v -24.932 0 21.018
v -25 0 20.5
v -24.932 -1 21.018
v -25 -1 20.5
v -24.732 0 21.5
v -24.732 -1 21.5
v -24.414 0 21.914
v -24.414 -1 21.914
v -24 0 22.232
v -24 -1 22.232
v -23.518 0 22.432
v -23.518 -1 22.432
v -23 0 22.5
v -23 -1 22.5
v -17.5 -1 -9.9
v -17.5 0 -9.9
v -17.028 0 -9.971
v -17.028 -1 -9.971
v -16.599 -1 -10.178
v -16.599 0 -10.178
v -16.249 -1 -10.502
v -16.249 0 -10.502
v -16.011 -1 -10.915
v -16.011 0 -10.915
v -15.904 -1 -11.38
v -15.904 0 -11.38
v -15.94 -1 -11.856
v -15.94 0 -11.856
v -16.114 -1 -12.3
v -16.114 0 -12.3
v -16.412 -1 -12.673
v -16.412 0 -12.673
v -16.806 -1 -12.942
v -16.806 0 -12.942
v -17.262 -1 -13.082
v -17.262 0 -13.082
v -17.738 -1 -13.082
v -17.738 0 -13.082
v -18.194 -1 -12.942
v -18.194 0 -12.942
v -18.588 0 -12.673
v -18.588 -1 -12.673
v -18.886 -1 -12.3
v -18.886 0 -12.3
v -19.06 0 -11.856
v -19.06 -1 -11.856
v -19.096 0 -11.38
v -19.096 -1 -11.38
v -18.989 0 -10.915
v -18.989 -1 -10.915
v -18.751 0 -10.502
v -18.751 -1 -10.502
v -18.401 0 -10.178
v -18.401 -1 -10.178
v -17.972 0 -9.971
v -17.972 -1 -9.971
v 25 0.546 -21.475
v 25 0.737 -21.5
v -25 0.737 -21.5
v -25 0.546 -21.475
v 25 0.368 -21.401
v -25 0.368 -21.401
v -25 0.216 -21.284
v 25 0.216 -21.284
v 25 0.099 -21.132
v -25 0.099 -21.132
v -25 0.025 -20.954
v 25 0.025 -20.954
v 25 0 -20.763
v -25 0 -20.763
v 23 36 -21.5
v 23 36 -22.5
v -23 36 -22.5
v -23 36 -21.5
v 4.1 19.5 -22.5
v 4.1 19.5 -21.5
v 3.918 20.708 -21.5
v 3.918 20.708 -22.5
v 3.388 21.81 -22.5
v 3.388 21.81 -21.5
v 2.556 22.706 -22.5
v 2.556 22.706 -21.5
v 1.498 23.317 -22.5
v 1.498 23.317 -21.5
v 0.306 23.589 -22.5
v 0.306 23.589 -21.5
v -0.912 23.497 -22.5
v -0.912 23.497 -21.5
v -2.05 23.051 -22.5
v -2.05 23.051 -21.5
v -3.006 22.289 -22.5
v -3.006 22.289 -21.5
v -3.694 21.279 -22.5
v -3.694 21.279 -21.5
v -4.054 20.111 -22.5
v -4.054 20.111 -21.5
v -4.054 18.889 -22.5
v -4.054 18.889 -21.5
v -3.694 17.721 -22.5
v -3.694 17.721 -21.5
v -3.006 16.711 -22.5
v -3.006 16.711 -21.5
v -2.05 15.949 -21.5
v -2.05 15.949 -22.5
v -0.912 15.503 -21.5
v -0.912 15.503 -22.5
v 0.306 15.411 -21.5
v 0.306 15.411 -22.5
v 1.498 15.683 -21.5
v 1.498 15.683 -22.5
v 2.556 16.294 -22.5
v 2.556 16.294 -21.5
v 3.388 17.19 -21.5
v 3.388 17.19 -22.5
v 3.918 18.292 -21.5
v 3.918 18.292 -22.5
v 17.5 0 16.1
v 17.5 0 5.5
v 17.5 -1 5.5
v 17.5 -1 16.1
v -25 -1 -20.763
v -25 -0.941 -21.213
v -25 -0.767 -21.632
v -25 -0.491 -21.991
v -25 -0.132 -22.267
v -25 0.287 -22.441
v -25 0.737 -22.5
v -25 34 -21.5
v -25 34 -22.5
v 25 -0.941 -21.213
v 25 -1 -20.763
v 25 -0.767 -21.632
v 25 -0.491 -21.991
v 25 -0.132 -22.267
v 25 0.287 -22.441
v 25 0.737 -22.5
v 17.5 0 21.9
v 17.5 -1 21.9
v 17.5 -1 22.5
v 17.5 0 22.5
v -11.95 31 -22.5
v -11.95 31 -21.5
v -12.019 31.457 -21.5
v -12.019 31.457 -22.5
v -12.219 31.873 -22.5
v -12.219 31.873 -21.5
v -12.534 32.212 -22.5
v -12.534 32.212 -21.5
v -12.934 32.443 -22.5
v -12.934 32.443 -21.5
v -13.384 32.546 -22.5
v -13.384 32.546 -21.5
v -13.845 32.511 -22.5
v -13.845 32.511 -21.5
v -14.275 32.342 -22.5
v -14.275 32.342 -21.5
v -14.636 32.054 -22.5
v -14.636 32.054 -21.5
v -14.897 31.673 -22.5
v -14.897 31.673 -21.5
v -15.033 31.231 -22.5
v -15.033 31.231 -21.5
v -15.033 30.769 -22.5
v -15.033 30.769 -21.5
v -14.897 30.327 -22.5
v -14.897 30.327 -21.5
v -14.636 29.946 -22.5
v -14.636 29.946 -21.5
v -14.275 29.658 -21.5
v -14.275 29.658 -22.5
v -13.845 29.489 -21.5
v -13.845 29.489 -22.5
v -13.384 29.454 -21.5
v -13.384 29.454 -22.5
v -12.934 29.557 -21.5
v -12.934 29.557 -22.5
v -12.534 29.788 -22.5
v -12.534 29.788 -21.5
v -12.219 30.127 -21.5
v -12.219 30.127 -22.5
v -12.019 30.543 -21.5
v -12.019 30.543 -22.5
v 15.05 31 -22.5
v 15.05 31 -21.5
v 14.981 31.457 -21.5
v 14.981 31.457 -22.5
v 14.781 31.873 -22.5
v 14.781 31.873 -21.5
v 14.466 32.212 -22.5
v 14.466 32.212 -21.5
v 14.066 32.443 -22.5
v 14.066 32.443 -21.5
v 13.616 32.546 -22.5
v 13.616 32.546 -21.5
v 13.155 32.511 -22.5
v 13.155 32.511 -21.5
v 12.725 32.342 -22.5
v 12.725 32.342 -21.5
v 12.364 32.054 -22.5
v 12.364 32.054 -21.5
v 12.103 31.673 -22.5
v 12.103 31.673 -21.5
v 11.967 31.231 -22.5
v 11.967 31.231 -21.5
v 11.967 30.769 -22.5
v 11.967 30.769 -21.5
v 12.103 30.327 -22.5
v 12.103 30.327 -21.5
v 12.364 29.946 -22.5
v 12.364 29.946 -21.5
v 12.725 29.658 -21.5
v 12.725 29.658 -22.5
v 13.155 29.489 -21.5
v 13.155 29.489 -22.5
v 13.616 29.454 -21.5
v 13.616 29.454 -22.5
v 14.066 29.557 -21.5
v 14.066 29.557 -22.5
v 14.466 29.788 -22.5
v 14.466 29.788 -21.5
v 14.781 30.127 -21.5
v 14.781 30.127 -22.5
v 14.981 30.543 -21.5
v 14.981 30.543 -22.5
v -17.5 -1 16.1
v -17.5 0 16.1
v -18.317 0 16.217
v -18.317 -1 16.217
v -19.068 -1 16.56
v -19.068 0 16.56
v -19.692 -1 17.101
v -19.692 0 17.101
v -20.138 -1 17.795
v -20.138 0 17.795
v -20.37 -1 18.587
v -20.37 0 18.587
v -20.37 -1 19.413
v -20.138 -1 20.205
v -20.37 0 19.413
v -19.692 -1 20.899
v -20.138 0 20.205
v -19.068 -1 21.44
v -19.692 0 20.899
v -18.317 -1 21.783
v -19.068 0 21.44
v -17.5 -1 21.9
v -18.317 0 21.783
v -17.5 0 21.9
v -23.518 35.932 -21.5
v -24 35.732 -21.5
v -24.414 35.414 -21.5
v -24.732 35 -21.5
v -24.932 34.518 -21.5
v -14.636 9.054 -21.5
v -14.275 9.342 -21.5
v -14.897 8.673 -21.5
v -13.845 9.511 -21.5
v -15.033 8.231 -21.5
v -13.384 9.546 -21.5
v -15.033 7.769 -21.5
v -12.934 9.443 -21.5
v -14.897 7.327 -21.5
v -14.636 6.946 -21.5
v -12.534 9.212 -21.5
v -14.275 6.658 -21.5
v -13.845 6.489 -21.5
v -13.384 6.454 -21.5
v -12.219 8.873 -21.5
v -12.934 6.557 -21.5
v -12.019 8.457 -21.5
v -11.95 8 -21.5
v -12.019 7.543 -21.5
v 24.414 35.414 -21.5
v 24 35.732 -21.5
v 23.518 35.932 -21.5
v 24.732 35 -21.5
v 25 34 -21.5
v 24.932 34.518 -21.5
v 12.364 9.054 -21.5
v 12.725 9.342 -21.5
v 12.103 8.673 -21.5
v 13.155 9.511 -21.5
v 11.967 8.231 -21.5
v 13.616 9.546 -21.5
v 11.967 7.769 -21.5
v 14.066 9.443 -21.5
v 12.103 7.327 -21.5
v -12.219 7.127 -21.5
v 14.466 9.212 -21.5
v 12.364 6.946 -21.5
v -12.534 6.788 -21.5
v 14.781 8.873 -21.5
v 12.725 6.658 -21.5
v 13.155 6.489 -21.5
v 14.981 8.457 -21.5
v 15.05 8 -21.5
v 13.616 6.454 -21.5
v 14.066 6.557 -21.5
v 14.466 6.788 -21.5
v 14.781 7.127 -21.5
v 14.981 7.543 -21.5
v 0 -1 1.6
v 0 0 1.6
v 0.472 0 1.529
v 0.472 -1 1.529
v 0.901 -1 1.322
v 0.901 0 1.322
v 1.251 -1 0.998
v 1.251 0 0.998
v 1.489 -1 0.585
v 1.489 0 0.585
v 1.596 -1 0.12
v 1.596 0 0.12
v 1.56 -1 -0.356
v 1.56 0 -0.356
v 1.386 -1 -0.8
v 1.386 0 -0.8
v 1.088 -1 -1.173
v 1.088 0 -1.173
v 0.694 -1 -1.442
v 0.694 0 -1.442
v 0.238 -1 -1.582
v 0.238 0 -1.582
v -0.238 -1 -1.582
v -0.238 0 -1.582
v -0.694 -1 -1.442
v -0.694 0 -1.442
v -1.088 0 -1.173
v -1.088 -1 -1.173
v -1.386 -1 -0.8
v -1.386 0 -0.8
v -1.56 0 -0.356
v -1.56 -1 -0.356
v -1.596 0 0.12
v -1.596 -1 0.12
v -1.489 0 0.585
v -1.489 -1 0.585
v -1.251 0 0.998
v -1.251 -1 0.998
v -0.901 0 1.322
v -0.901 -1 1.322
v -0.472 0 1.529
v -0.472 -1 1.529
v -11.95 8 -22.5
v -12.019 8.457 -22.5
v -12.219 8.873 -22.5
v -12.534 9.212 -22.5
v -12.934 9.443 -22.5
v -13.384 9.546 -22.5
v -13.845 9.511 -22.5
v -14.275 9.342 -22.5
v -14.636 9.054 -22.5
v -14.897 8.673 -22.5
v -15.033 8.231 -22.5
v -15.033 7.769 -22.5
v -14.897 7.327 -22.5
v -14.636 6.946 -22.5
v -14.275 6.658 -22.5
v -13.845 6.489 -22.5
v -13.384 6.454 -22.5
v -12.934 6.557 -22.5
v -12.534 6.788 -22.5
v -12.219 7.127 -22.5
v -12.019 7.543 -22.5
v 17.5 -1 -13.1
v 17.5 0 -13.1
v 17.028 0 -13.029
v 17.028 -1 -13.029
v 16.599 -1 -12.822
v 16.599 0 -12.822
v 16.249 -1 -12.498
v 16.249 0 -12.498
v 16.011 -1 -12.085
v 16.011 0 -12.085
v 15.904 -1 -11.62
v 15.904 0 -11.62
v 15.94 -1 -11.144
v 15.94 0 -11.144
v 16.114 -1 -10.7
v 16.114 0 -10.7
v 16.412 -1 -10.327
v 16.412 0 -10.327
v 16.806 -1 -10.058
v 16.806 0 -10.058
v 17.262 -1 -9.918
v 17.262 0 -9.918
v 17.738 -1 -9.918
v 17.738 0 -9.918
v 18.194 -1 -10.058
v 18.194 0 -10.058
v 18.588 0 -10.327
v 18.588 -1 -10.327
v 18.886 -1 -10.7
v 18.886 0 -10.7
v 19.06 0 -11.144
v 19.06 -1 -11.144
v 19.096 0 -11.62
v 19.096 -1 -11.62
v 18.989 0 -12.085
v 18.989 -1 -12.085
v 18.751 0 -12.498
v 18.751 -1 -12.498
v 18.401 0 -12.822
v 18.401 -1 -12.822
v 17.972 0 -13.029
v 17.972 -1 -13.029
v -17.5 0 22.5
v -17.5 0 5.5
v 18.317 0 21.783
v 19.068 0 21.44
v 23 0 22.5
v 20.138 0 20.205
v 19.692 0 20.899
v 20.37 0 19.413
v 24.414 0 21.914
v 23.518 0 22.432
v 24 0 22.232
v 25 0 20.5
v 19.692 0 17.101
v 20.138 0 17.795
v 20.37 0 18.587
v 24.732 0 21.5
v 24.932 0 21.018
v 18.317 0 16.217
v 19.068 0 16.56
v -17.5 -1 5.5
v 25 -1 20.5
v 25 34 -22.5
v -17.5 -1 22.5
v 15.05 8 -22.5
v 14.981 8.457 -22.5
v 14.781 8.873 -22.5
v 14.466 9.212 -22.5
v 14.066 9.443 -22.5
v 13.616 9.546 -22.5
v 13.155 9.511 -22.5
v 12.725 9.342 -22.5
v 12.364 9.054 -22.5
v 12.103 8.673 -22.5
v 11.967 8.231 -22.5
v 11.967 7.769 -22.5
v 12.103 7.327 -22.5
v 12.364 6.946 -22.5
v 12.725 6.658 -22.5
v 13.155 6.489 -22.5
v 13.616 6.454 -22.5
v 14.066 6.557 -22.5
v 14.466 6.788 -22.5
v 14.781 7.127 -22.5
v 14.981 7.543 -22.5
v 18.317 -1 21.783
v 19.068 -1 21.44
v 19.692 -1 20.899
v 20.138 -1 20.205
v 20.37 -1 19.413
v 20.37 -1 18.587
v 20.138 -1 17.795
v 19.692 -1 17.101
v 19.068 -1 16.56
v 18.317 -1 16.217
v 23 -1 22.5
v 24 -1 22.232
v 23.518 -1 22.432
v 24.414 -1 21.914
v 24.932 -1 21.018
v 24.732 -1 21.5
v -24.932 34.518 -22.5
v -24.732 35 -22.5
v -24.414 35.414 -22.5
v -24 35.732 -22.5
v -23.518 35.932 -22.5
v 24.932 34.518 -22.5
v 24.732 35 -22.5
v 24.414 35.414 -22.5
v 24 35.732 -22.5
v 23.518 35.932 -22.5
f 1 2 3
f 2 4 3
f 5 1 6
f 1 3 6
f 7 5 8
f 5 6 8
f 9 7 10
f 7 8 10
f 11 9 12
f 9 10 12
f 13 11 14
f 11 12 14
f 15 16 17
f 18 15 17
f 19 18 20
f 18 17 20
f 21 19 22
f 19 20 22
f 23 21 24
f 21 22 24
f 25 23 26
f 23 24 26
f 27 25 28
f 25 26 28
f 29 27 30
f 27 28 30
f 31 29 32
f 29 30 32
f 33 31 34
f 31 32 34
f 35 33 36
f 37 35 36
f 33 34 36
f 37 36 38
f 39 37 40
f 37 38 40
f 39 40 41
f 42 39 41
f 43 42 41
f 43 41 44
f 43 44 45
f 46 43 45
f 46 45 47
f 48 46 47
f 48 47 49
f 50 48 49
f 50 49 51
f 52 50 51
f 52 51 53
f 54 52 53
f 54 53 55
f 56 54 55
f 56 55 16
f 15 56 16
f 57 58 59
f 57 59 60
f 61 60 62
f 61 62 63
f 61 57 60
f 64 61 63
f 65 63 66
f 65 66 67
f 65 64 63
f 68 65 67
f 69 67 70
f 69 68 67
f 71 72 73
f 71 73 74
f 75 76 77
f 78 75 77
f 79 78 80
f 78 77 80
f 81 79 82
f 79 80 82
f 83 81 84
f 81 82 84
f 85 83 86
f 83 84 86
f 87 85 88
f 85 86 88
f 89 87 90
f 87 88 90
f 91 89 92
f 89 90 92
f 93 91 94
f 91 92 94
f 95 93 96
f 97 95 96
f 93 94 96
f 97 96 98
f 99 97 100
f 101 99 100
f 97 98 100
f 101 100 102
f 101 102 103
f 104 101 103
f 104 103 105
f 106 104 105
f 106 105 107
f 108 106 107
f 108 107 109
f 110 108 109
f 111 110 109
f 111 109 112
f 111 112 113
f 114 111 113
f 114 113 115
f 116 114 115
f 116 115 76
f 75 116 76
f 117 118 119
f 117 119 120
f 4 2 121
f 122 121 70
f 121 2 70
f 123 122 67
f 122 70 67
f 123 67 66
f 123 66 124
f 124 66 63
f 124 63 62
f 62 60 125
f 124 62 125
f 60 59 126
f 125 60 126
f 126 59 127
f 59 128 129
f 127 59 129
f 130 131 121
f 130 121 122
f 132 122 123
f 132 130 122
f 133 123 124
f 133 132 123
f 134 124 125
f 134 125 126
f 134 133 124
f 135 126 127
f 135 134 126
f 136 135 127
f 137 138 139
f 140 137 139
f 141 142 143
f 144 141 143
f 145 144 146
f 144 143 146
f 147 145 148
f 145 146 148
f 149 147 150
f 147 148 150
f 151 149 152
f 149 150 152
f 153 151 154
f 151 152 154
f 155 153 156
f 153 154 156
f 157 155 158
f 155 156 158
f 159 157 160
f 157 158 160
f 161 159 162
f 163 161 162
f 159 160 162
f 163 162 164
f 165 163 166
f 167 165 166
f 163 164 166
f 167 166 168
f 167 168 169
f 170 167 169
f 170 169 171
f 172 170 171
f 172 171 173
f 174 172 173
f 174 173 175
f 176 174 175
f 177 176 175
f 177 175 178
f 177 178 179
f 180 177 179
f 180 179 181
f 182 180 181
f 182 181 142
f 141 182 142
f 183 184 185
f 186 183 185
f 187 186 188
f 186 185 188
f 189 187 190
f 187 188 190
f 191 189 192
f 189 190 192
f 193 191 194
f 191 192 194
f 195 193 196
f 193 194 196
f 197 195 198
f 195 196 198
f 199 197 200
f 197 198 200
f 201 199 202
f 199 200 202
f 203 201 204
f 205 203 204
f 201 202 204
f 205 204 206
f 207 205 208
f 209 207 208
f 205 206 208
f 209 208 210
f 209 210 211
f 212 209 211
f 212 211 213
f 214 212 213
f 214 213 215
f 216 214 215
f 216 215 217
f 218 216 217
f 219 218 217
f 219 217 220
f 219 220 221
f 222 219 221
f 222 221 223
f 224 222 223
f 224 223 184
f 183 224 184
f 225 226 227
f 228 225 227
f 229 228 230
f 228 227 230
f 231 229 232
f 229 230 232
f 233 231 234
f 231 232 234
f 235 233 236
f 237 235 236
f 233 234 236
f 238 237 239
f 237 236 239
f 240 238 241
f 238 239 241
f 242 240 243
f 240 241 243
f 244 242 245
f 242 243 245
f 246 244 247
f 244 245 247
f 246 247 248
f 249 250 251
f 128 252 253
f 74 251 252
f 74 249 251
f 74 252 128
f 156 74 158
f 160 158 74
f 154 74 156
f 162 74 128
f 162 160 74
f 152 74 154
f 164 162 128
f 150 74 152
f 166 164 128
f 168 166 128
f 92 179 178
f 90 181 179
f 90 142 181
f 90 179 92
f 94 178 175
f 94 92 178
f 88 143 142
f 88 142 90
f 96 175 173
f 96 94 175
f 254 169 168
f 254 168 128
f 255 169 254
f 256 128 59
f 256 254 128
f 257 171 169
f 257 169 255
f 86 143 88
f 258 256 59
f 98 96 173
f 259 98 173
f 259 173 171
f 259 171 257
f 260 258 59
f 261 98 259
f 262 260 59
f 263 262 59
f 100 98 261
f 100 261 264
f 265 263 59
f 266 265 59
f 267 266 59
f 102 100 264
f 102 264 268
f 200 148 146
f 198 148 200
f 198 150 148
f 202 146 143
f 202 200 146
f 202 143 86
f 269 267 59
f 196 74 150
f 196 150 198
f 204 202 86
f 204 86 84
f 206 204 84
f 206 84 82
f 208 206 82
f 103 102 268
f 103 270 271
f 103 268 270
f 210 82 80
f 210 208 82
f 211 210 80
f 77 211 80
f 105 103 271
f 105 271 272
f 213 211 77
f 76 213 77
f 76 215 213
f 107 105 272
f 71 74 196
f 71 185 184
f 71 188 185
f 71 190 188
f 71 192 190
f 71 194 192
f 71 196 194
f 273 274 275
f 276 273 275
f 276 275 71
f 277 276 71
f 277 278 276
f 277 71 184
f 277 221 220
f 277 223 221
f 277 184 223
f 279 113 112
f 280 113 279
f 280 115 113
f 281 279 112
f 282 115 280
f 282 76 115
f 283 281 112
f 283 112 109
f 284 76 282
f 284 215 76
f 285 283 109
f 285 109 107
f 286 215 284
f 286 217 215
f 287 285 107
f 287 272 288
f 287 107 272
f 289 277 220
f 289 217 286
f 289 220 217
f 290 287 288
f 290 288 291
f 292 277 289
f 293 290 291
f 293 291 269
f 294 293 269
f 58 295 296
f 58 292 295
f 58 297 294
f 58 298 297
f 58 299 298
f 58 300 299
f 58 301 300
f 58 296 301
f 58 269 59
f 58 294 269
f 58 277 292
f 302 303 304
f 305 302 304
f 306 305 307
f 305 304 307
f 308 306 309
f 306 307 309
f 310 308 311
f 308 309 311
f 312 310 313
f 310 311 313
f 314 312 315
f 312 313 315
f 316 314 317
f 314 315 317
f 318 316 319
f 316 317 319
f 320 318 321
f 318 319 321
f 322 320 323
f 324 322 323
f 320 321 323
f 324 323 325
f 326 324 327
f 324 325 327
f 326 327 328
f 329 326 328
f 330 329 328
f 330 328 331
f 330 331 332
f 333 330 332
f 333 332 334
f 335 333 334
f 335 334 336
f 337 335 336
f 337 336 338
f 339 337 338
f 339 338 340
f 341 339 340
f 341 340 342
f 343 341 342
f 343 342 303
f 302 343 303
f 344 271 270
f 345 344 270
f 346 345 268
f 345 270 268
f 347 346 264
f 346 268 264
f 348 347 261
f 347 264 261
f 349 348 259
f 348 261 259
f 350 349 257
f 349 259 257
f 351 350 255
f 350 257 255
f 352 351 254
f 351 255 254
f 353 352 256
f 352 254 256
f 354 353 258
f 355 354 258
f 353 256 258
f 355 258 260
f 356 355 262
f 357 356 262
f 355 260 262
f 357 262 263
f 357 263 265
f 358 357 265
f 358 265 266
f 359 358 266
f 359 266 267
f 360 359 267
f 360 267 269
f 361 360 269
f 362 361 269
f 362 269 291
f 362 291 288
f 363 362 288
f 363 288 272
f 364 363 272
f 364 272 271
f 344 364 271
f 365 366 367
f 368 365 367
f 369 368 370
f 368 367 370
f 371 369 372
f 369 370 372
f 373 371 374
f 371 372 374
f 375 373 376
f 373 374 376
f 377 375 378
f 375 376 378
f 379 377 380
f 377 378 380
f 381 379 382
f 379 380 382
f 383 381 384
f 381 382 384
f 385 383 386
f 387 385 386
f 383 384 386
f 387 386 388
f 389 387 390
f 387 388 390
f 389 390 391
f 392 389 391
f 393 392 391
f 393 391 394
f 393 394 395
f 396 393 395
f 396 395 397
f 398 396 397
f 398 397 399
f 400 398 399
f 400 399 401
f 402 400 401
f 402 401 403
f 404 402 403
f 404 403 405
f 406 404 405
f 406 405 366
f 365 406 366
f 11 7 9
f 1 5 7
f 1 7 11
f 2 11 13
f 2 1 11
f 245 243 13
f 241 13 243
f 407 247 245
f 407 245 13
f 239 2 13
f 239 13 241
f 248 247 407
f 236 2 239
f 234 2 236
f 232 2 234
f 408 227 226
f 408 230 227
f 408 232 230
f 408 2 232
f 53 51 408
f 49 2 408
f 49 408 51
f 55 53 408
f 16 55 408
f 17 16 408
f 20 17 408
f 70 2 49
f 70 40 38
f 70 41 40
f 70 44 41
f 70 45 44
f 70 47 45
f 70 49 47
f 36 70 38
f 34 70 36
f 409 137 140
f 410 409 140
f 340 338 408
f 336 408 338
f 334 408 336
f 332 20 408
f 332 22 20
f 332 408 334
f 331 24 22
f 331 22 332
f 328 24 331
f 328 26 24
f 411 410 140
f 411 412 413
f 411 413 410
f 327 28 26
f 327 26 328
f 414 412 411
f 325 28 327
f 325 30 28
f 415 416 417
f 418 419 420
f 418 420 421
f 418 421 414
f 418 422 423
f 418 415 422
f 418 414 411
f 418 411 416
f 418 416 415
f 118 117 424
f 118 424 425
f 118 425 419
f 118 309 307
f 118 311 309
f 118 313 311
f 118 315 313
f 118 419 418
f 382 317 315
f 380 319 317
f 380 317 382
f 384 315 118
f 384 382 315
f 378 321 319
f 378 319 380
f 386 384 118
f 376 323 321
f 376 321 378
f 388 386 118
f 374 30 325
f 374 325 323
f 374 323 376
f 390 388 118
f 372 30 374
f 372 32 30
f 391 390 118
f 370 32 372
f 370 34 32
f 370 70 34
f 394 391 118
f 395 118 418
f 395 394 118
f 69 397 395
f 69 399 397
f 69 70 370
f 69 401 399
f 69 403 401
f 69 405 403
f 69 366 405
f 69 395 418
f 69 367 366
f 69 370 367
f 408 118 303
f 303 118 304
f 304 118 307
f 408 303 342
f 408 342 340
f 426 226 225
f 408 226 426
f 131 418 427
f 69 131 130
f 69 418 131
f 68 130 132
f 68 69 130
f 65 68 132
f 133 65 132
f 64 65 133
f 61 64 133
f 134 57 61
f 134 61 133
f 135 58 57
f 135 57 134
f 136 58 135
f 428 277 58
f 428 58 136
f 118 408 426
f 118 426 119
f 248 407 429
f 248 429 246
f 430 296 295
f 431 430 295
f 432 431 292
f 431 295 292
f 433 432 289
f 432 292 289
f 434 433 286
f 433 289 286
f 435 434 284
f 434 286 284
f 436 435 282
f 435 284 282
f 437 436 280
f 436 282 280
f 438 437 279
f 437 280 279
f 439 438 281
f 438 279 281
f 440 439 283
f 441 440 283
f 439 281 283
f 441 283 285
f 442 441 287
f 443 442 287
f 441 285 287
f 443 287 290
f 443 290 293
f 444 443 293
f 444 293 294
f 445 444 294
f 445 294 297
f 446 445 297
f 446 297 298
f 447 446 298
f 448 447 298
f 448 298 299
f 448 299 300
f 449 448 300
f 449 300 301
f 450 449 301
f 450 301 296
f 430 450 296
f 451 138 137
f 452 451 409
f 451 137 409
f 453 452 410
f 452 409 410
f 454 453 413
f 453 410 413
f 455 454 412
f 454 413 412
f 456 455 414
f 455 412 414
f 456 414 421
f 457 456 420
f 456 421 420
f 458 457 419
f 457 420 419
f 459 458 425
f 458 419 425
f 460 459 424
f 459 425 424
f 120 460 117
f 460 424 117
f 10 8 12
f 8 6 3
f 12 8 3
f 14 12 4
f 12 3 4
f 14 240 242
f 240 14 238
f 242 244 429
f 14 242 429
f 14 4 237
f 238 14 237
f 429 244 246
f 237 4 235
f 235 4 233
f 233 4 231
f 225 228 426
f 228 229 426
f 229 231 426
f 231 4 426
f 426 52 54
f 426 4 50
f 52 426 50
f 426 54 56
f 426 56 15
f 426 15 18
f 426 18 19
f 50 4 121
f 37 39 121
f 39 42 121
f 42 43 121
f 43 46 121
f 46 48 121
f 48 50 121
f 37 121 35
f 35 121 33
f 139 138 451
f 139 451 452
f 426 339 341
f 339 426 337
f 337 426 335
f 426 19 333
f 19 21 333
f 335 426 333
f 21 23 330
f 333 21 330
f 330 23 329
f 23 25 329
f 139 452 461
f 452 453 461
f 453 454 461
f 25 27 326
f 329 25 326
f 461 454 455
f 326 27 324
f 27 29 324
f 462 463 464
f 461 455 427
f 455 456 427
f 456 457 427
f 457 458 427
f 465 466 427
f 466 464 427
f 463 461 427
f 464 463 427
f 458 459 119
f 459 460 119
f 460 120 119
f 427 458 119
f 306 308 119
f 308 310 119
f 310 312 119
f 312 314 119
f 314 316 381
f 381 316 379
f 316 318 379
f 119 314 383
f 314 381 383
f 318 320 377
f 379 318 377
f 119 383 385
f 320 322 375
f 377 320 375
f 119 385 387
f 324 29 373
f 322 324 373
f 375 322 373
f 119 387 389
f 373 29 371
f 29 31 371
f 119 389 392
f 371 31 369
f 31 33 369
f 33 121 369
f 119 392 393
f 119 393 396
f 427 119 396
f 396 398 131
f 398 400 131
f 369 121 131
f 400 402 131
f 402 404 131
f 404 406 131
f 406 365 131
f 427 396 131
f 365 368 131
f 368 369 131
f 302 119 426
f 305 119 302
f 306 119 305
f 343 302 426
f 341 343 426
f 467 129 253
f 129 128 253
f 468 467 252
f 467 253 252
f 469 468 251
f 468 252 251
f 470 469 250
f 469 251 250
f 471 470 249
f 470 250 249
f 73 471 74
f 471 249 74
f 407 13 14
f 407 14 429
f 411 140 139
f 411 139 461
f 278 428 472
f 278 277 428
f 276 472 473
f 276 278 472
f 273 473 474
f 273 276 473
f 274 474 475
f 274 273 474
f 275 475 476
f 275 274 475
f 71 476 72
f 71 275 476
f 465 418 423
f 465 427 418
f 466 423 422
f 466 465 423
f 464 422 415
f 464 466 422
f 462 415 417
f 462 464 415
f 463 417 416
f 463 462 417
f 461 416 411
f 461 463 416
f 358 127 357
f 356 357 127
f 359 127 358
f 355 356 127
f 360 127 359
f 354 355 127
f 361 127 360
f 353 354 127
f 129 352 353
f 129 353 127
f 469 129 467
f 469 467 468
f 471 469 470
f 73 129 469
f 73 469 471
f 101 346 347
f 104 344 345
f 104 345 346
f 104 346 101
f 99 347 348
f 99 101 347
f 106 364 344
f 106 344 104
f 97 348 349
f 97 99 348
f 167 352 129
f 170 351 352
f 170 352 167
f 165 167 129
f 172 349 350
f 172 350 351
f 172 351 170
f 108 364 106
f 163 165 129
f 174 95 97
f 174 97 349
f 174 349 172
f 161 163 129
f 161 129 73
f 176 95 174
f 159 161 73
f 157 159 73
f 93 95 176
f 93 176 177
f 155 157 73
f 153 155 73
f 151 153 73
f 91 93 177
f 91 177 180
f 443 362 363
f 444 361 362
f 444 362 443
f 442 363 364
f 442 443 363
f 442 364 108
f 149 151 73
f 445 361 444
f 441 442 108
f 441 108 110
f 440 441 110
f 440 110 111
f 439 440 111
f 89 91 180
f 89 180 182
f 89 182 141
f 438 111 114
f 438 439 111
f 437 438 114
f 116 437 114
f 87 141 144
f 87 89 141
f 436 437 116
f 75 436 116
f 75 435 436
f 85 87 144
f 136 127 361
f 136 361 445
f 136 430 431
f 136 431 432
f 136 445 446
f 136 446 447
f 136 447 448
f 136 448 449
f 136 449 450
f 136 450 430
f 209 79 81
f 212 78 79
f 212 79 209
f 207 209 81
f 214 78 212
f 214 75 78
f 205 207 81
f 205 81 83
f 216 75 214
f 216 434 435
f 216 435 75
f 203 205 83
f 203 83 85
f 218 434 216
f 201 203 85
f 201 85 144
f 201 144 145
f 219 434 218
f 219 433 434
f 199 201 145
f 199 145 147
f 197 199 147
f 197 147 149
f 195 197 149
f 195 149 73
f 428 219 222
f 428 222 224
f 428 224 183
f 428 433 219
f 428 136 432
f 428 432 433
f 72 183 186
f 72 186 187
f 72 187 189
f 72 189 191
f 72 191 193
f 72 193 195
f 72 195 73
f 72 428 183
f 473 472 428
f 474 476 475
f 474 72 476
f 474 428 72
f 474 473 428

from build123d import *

# Parameters (mm, degrees)
SM_BASE_FLANGE_1_DEPTH           = 1
SM_EDGE_FLANGE_2_STRIP_W         = 5.4732
SM_EDGE_FLANGE_2_STRIP_H         = 1
SM_EDGE_FLANGE_2_STRIP_CUT_DEPTH = 50
SM_EDGE_FLANGE_2_DEPTH           = 50
SKETCH_10_R                      = 1.55
SKETCH_10_R_2                    = 4.1
CUT_EXTRUDE_7_DEPTH              = 10
CUT_EXTRUDE_6_REACH              = 51.267
SKETCH_19_R                      = 2.9
SKETCH_19_R_2                    = 1.6
FILLET_2_R                       = 2


# Sheet-metal steps are written as plain solids
with BuildPart() as part:
    # Sketch 2 → 基体-法兰1 (new body)
    with BuildSketch(Plane(origin=(0, 0, 0), x_dir=(1, 0, 0), z_dir=(0, 1, 0))):
        Polygon((-17.5, -5.5), (17.5, -5.5), (17.5, -22.5), (25, -22.5), (25, 22.5), (-25, 22.5), (-25, -22.5), (-17.5, -22.5), align=None)
    extrude(amount=-SM_BASE_FLANGE_1_DEPTH)

    # 边线-法兰2 strip (across the edge) → 边线-法兰2 strip cut (cut)
    with BuildSketch(Plane(origin=(25, 0, -22.5), x_dir=(0, 0, 1), z_dir=(-1, 0, 0))):
        with Locations((-1, -0.5)):
            Rectangle(SM_EDGE_FLANGE_2_STRIP_W, SM_EDGE_FLANGE_2_STRIP_H)
    extrude(amount=SM_EDGE_FLANGE_2_STRIP_CUT_DEPTH, mode=Mode.SUBTRACT)

    # 边线-法兰2 section (across the edge) → 边线-法兰2 (add)
    with BuildSketch(Plane(origin=(25, 0, -22.5), x_dir=(0, 0, 1), z_dir=(-1, 0, 0))):
        with BuildLine():
            Line((0, 0.7366), (0, 36))
            Line((0, 36), (1, 36))
            Line((1, 36), (1, 0.7366))
            ThreePointArc((1, 0.7366), (1.215745145, 0.215745145), (1.7366, 0))
            Line((1.7366, 0), (1.7366, -1))
            ThreePointArc((1.7366, -1), (0.508638364, -0.491361636), (0, 0.7366))
        make_face()
    extrude(amount=SM_EDGE_FLANGE_2_DEPTH)

    # 草图10 → 切除-拉伸7 (cut)
    with BuildSketch(Plane.XY.offset(-21.5)):
        with Locations((-13.5, 31)):
            Circle(SKETCH_10_R)
        with Locations((13.5, 31)):
            Circle(SKETCH_10_R)
        with Locations((13.5, 8)):
            Circle(SKETCH_10_R)
        with Locations((-13.5, 8)):
            Circle(SKETCH_10_R)
        with Locations((0, 19.5)):
            Circle(SKETCH_10_R_2)
    extrude(amount=-CUT_EXTRUDE_7_DEPTH, mode=Mode.SUBTRACT)

    # 草图19 → 切除-拉伸6 (cut, up to next)
    with BuildSketch(Plane(origin=(0, 0, 0), x_dir=(1, 0, 0), z_dir=(0, 1, 0)), mode=Mode.PRIVATE) as cut_extrude_6_sk1:
        with Locations((-17.5, -19)):
            Circle(SKETCH_19_R)
    cut_extrude_6_tool1 = extrude(cut_extrude_6_sk1.sketch, amount=-CUT_EXTRUDE_6_REACH, mode=Mode.PRIVATE) & part.part
    # 草图19 → 切除-拉伸6 (cut, up to next)
    with BuildSketch(Plane(origin=(0, 0, 0), x_dir=(1, 0, 0), z_dir=(0, 1, 0)), mode=Mode.PRIVATE) as cut_extrude_6_sk2:
        with Locations((17.5, -19)):
            Circle(SKETCH_19_R)
    cut_extrude_6_tool2 = extrude(cut_extrude_6_sk2.sketch, amount=-CUT_EXTRUDE_6_REACH, mode=Mode.PRIVATE) & part.part
    # 草图19 → 切除-拉伸6 (cut, up to next)
    with BuildSketch(Plane(origin=(0, 0, 0), x_dir=(1, 0, 0), z_dir=(0, 1, 0)), mode=Mode.PRIVATE) as cut_extrude_6_sk3:
        with Locations(Location((-17.5, 11.5, 0), (0, 0, 270))):
            Circle(SKETCH_19_R_2)
    cut_extrude_6_tool3 = extrude(cut_extrude_6_sk3.sketch, amount=-CUT_EXTRUDE_6_REACH, mode=Mode.PRIVATE) & part.part
    # 草图19 → 切除-拉伸6 (cut, up to next)
    with BuildSketch(Plane(origin=(0, 0, 0), x_dir=(1, 0, 0), z_dir=(0, 1, 0)), mode=Mode.PRIVATE) as cut_extrude_6_sk4:
        with Locations(Location((17.5, 11.5, 0), (0, 0, 90))):
            Circle(SKETCH_19_R_2)
    cut_extrude_6_tool4 = extrude(cut_extrude_6_sk4.sketch, amount=-CUT_EXTRUDE_6_REACH, mode=Mode.PRIVATE) & part.part
    # 草图19 → 切除-拉伸6 (cut, up to next)
    with BuildSketch(Plane(origin=(0, 0, 0), x_dir=(1, 0, 0), z_dir=(0, 1, 0)), mode=Mode.PRIVATE) as cut_extrude_6_sk5:
        with Locations(Location((0, 0, 0), (0, 0, 270))):
            Circle(SKETCH_19_R_2)
    cut_extrude_6_tool5 = extrude(cut_extrude_6_sk5.sketch, amount=-CUT_EXTRUDE_6_REACH, mode=Mode.PRIVATE) & part.part
    add(cut_extrude_6_tool1.solids().sort_by_distance((-17.5, 0, 19))[0], mode=Mode.SUBTRACT)
    add(cut_extrude_6_tool2.solids().sort_by_distance((17.5, 0, 19))[0], mode=Mode.SUBTRACT)
    add(cut_extrude_6_tool3.solids().sort_by_distance((-17.5, 0, -11.5))[0], mode=Mode.SUBTRACT)
    add(cut_extrude_6_tool4.solids().sort_by_distance((17.5, 0, -11.5))[0], mode=Mode.SUBTRACT)
    add(cut_extrude_6_tool5.solids().sort_by_distance((0, 0, 0))[0], mode=Mode.SUBTRACT)

    # 圆角2
    fillet_2_edges = [part.edges().sort_by_distance(p)[0] for p in [
        (-25, -0.5, 22.5),
        (25, -0.5, 22.5),
        (25, 36, -22),
        (-25, 36, -22),
    ]]
    fillet(fillet_2_edges, radius=FILLET_2_R)


solid = part.part
